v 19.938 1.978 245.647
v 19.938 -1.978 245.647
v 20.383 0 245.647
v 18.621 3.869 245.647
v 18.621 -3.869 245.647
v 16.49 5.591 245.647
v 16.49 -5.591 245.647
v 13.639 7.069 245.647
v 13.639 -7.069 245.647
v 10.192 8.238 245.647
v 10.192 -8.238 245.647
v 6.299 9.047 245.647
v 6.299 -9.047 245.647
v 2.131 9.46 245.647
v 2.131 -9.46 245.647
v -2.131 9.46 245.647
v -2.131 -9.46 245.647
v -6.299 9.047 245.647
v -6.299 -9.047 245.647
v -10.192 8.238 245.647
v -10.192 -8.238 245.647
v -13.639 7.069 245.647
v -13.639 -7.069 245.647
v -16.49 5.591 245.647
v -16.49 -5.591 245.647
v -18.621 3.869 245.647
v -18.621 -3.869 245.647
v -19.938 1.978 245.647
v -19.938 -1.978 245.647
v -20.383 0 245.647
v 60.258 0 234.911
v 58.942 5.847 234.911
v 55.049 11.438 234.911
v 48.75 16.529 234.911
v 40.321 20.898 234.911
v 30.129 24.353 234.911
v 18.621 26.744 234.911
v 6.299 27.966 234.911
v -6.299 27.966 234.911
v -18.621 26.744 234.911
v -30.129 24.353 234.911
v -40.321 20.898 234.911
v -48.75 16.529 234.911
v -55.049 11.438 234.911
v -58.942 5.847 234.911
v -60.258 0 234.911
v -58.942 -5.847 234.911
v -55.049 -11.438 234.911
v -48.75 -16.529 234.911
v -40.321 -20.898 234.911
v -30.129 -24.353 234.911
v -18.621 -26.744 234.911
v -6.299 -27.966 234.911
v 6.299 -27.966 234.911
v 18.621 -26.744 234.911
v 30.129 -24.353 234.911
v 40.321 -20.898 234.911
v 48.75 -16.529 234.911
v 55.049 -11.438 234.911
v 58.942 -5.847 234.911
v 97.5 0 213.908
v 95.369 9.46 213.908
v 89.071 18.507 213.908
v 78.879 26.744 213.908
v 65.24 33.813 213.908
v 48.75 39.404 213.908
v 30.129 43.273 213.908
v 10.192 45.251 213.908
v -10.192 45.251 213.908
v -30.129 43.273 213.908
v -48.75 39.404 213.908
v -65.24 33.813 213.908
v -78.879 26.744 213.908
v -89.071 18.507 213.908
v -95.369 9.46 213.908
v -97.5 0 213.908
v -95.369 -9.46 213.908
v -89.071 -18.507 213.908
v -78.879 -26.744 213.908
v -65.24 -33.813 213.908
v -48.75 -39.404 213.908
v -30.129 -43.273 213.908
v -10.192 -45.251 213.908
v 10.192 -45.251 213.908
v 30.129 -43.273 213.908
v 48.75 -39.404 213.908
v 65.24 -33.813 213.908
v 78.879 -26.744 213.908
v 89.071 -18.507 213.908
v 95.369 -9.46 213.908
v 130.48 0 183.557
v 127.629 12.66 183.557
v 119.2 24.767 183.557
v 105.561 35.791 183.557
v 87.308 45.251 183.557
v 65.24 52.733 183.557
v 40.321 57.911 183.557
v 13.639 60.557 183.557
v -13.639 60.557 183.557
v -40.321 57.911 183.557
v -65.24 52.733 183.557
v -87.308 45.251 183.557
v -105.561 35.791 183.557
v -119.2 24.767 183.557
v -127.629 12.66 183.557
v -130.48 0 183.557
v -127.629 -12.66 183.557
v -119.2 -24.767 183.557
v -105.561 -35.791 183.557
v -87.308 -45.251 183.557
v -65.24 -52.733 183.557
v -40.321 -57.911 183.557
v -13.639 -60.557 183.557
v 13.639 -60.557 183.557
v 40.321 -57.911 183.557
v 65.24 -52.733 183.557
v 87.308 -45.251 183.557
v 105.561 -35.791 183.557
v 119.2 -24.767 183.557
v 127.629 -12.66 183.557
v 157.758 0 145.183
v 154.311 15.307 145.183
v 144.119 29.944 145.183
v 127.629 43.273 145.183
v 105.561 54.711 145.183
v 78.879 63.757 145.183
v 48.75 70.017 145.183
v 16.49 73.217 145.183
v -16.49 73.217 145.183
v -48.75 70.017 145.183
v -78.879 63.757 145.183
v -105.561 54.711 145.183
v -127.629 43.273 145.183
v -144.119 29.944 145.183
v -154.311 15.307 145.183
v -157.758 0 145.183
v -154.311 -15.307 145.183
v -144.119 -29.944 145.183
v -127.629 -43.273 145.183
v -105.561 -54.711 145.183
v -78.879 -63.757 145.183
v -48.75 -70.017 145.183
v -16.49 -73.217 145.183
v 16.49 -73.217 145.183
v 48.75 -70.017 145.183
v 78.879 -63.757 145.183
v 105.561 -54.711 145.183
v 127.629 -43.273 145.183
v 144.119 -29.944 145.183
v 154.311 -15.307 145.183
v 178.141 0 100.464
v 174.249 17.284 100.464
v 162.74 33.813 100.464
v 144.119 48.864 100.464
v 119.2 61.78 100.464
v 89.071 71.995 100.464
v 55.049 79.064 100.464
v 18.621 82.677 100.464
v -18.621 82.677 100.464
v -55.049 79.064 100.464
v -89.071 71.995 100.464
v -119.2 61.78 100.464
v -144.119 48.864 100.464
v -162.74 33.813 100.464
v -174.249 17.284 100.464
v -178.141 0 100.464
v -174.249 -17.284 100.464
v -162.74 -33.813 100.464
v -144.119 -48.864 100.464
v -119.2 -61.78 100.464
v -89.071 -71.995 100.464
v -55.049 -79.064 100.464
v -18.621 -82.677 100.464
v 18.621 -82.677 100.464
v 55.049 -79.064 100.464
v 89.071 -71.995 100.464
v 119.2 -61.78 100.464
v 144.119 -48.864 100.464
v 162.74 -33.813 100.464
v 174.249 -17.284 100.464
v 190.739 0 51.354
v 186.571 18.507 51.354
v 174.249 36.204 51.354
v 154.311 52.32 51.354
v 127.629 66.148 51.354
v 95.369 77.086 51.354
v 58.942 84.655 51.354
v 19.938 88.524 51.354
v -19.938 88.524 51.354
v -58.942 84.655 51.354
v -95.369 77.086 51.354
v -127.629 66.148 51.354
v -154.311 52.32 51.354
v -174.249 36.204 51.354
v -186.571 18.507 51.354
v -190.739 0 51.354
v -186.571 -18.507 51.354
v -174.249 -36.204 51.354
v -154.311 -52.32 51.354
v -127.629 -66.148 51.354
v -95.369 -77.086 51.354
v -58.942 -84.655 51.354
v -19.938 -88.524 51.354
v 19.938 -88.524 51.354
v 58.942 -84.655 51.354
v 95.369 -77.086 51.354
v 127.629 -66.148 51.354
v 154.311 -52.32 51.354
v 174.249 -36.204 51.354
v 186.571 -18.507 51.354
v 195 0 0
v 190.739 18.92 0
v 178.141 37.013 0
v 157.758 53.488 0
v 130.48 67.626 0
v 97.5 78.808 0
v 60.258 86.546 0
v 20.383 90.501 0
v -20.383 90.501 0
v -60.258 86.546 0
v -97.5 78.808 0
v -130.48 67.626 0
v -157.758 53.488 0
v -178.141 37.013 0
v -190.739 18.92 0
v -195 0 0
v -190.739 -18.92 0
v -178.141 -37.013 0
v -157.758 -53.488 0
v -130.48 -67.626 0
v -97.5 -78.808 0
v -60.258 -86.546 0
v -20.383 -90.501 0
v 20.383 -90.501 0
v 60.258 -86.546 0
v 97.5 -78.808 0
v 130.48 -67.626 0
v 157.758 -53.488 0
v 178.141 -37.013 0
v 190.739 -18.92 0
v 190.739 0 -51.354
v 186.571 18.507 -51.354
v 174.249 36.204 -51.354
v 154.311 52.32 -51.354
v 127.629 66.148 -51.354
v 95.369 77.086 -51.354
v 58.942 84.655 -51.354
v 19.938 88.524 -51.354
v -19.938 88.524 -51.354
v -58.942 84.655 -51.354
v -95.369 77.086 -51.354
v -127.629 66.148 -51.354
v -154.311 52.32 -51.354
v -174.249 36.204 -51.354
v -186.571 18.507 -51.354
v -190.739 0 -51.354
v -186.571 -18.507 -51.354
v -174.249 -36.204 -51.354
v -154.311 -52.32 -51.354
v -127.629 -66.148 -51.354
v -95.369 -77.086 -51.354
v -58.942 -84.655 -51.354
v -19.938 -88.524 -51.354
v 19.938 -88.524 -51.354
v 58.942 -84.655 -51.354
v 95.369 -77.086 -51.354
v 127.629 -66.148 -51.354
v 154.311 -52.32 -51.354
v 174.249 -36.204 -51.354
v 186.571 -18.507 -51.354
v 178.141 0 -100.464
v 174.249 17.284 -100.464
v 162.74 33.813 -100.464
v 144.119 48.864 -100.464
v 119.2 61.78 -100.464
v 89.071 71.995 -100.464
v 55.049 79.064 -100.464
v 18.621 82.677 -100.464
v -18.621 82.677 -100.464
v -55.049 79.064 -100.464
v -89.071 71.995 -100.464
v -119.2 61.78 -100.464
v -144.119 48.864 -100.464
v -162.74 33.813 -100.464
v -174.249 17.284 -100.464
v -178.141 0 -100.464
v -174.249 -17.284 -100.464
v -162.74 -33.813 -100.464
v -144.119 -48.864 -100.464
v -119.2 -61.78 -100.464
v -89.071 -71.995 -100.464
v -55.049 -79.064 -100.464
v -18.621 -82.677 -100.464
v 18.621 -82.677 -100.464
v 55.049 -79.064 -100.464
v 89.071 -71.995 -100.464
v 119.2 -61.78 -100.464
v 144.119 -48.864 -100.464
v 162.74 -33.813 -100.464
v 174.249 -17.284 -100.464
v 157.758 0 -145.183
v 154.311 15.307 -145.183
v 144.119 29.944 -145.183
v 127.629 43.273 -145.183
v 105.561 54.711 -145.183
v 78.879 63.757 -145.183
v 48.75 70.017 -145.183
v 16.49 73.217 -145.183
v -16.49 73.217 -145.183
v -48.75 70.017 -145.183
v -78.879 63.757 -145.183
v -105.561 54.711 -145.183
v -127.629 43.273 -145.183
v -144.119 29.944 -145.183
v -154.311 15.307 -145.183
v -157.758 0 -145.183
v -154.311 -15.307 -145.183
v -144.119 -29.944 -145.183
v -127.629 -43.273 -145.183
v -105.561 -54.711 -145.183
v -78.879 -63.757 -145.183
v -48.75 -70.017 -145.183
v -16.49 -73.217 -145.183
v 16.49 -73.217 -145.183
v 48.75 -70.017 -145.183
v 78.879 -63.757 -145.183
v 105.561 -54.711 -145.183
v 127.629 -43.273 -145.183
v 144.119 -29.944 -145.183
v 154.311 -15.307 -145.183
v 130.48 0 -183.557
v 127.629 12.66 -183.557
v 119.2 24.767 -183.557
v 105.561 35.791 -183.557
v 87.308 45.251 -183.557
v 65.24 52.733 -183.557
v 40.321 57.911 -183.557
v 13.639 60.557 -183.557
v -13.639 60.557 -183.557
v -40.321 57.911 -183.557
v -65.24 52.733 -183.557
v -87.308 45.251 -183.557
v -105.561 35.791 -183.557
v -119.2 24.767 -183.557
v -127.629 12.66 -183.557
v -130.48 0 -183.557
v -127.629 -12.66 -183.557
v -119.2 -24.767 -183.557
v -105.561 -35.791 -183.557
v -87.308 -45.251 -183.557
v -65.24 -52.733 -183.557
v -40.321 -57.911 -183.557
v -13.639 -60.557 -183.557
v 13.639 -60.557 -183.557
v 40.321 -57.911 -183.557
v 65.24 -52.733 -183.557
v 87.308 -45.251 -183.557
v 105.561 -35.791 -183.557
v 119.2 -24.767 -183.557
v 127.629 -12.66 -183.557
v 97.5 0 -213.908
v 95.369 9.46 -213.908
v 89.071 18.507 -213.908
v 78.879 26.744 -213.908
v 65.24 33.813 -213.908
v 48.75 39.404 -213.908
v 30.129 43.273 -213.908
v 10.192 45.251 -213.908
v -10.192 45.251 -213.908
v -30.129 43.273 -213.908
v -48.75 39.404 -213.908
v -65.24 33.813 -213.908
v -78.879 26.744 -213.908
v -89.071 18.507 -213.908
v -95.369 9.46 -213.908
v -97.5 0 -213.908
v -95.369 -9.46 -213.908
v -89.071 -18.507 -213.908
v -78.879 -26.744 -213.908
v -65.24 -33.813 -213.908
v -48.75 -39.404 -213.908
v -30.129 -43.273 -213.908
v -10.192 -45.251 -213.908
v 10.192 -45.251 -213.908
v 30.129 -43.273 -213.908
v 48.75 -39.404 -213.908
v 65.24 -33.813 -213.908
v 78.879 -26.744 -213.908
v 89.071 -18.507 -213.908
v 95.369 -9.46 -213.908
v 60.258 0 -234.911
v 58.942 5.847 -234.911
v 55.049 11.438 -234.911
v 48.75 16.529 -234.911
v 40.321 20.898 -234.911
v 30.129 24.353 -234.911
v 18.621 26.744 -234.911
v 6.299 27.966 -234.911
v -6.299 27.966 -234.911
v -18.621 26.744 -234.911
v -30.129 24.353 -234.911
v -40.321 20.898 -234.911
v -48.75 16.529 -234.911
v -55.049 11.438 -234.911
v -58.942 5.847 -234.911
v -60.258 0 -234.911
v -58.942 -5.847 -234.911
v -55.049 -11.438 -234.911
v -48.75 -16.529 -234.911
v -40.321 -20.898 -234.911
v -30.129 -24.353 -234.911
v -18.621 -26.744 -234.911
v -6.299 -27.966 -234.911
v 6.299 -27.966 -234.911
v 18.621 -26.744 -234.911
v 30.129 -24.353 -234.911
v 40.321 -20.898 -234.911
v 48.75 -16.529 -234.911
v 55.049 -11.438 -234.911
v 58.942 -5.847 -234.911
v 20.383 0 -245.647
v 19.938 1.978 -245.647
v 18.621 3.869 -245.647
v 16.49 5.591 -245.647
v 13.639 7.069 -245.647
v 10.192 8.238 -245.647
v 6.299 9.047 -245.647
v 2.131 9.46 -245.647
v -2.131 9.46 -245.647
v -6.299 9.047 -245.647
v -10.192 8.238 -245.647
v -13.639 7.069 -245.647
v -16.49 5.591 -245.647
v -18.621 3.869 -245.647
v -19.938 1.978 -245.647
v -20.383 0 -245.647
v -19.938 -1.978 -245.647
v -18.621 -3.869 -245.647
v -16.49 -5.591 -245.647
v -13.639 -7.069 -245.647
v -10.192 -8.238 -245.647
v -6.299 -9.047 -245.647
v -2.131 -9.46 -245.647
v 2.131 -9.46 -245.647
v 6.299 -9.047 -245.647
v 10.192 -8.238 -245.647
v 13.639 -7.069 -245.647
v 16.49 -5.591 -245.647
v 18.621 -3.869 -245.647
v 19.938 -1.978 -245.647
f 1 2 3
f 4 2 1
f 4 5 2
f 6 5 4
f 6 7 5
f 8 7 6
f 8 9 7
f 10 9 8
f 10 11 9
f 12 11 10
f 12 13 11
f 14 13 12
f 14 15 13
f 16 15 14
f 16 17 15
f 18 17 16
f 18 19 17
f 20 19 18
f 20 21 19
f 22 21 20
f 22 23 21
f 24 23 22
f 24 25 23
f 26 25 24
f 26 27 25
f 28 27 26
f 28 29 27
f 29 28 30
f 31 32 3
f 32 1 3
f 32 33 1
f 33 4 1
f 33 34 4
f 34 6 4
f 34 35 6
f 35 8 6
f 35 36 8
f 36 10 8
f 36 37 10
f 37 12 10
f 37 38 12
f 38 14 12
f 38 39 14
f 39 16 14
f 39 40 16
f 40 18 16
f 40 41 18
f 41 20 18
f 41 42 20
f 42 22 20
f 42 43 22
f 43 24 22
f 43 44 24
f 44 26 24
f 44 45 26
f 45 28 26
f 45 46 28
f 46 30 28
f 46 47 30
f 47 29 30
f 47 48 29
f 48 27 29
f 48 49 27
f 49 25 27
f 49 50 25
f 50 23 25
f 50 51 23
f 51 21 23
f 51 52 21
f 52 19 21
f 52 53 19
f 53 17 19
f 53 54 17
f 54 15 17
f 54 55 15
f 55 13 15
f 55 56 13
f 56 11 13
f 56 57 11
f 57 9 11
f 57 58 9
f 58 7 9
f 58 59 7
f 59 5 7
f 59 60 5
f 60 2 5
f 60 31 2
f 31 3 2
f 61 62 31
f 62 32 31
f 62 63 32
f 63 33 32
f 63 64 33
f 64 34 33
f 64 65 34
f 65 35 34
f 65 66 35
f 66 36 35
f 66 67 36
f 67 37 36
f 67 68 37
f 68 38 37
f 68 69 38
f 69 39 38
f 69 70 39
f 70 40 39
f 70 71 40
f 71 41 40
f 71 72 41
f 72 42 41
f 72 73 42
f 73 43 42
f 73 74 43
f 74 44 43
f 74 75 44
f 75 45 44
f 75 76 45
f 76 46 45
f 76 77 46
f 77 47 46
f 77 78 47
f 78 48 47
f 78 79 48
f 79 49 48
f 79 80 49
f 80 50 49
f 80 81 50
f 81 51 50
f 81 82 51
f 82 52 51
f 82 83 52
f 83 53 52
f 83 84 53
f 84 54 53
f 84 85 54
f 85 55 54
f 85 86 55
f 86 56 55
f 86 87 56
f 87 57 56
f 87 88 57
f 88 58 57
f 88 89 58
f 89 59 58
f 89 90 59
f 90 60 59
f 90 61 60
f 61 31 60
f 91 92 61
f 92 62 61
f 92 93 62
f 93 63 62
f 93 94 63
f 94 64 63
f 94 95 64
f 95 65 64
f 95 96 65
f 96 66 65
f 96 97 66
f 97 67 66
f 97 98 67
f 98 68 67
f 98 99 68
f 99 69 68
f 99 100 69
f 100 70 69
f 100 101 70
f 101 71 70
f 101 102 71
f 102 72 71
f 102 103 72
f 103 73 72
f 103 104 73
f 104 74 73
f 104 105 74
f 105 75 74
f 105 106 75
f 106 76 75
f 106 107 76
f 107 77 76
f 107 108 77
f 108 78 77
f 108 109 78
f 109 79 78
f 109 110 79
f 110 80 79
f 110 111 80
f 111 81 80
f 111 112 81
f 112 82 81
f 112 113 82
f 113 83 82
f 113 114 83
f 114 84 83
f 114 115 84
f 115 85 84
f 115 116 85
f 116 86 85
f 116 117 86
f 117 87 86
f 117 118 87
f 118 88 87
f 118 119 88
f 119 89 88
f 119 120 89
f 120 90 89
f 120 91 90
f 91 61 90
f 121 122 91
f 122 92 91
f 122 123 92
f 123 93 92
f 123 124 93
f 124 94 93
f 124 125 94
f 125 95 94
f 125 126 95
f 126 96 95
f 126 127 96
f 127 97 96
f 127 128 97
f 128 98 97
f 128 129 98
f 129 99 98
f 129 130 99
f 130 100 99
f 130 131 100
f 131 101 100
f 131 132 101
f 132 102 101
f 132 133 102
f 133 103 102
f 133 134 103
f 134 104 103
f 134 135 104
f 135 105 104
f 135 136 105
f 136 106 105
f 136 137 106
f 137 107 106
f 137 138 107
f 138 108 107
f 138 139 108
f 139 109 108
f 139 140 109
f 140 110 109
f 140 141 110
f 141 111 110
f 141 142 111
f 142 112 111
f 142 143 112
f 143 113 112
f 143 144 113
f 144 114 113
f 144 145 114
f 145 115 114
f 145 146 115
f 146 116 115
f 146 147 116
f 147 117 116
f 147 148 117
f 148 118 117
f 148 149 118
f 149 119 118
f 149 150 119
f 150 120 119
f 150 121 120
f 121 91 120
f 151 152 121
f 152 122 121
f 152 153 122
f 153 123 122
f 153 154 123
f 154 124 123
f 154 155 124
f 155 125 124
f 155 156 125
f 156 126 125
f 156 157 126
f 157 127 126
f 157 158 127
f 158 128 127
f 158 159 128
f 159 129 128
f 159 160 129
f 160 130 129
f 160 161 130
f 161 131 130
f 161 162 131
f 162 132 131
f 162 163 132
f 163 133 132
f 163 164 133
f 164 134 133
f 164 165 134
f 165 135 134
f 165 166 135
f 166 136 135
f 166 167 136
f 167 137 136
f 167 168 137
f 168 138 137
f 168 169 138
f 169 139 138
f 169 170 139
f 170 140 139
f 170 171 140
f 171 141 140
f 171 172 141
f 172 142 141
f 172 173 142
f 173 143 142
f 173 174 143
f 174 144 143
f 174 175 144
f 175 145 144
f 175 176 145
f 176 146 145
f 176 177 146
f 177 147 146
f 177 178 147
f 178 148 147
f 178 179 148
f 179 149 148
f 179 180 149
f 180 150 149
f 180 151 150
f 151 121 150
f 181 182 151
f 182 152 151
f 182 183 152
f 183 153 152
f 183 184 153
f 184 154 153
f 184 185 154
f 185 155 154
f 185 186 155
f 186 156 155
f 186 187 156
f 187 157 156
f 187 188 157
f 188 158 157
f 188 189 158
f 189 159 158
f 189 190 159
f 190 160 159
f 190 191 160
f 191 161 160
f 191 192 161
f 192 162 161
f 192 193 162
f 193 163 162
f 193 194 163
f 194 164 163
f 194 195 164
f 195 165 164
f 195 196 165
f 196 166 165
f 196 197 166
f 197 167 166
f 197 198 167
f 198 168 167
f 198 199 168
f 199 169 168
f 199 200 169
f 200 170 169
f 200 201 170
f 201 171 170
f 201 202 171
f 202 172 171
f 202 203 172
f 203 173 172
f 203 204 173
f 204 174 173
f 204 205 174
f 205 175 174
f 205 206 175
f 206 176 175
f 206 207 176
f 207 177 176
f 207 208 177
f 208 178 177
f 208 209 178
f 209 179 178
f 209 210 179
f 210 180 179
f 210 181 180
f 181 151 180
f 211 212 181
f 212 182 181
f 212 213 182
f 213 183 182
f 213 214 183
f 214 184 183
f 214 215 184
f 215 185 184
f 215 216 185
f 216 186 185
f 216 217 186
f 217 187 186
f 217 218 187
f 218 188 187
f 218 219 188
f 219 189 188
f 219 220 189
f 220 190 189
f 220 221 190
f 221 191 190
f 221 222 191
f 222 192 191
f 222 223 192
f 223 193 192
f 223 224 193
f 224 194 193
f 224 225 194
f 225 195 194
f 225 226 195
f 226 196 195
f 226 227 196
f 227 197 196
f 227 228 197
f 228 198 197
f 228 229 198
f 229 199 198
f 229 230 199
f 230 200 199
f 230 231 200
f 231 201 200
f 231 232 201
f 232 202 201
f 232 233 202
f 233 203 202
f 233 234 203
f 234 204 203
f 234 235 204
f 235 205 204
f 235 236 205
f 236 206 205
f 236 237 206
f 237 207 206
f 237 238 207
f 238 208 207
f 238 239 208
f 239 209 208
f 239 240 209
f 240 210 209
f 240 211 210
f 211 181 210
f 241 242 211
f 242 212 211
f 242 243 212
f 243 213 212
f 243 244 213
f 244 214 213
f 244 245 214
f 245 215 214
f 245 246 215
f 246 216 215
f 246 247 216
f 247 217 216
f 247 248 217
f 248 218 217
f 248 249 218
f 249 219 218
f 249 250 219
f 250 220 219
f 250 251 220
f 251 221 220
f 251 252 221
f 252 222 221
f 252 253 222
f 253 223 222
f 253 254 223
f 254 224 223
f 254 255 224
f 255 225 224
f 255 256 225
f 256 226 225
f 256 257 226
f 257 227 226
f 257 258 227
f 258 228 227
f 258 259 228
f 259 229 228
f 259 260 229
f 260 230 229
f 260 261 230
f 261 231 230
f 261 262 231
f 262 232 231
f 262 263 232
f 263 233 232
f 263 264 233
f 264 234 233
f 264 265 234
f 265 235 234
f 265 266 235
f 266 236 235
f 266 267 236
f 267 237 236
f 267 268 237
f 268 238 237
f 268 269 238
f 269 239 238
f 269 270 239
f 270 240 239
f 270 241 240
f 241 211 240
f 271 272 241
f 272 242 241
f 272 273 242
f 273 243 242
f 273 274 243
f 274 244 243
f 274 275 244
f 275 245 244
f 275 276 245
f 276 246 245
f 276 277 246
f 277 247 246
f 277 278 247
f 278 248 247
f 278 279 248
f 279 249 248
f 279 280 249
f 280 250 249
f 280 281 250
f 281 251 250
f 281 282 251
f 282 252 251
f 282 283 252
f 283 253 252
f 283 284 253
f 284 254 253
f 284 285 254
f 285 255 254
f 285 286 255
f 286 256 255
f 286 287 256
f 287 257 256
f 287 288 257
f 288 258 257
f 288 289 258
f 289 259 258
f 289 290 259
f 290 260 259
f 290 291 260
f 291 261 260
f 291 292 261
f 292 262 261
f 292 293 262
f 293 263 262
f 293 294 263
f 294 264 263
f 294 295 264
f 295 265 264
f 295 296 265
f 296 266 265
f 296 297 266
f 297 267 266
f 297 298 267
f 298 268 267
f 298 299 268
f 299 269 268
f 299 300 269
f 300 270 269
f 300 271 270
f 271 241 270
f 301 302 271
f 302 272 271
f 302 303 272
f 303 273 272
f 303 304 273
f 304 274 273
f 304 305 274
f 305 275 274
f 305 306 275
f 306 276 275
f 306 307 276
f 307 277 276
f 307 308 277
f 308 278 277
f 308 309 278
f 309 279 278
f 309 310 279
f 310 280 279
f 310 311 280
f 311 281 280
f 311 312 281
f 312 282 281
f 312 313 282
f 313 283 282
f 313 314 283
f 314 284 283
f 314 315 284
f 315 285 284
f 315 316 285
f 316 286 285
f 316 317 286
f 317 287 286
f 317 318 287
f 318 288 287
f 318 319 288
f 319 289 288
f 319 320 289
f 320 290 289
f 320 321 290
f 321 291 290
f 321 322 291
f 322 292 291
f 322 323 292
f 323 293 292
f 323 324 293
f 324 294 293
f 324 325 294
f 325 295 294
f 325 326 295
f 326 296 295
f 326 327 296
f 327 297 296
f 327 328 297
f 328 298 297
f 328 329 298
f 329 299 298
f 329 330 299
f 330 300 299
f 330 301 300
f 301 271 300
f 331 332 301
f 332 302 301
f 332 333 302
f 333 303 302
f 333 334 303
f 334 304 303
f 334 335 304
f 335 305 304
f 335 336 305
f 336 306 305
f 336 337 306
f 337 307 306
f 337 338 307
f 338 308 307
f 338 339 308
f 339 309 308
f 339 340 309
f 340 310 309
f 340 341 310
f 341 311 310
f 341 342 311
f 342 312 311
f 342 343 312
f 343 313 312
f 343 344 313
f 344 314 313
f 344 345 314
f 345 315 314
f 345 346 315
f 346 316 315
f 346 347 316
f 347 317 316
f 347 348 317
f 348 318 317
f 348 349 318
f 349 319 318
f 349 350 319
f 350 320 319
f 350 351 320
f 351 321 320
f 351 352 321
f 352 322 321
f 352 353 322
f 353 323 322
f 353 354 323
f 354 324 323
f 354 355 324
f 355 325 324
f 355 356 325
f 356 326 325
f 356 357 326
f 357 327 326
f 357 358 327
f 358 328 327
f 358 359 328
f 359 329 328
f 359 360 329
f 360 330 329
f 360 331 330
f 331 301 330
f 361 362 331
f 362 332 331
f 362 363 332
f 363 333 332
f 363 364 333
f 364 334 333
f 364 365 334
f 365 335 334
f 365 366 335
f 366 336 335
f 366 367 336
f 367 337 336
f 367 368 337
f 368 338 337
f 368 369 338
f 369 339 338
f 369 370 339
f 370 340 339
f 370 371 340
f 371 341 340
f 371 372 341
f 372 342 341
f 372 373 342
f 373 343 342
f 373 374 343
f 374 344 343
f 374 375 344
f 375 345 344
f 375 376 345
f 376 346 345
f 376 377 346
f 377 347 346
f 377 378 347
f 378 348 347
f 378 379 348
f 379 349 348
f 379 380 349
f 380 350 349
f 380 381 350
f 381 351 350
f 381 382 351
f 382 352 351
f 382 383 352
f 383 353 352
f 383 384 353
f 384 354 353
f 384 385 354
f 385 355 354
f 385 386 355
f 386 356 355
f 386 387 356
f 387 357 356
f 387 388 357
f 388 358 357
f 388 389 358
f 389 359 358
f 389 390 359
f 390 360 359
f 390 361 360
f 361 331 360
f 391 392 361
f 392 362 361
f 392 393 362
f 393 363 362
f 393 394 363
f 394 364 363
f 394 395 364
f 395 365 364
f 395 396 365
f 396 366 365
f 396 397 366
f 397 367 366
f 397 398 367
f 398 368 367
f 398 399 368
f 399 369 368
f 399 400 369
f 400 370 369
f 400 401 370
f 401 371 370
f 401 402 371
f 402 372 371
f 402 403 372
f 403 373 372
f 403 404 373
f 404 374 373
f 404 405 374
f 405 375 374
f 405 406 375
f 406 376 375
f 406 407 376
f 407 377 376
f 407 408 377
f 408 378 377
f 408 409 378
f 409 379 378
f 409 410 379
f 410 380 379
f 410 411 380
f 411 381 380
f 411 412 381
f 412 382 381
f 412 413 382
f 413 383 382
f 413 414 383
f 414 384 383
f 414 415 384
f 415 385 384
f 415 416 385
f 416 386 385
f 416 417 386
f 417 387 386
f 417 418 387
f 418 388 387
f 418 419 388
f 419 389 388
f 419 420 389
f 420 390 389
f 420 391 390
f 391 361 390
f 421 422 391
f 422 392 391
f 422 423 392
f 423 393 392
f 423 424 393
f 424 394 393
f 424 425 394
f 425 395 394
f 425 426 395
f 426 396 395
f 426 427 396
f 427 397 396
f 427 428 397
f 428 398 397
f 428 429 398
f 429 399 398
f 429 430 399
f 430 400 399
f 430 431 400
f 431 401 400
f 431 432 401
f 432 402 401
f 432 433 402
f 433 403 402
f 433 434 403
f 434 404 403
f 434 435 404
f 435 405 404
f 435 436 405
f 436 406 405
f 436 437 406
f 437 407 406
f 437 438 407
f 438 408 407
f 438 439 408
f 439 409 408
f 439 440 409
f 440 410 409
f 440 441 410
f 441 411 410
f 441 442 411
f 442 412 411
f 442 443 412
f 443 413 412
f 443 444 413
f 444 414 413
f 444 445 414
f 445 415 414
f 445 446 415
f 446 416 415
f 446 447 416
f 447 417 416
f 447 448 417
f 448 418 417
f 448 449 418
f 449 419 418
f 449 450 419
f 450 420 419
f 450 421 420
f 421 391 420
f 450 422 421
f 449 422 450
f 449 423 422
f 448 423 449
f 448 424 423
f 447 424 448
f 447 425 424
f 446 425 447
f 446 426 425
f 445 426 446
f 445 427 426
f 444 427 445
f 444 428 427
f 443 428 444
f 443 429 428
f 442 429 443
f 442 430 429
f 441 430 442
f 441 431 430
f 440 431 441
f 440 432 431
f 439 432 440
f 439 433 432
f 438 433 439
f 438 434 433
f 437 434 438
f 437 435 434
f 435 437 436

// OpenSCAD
// Generated by SolidPython 1.0.1 on 2020-07-29 00:46:51


scale(v = [15, 7, 19]) {
	sphere(r = 13);
}
/***********************************************
*********      SolidPython code:      **********
************************************************
 
# import packages: SolidPython
from solid import *
from solid.utils import *
from itertools import chain, combinations, permutations


class Resize:

    def __init__(self, scad_file):
        self.scad_file = scad_file
        #self.scad_file = import_scad(scad_file)
        # cone/cylinder param:
        self.r1 = 0
        self.r2 = 0
        self.h = 0
        # rectangular prism param:
        self.w = 0
        self.l = 0
        # ellipse param:
        self.r = 0

    # import OpenScad code (file name corresponds to shape)


    # classify shape + parameters
    def assign(self, param1, param2, param3):
        if self.scad_file == 'cone.scad':
            self.r1 = param1
            self.r2 = param2
            self.h = param3
        elif self.scad_file == 'cylinder.scad':
            self.r1 = param1
            self.r2 = param2
            self.h = param3
        elif self.scad_file == 'rectangularPrism.scad':
            self.h = param1
            self.l = param2
            self.w = param3
        else:
            self.r = param1
            self.h = param2

    # resize parameters
    def iterate(self):
        x = range(3, 20, 2)
        i = 1
        if self.scad_file == 'cone.scad':
            tempList = list(permutations(x, 2))
            for temp in tempList:
                param1 = temp[0]
                param2 = temp[1]
                filepath = 'produced_scad_files/' + 'cone' + str(param1) + '_' + str(param2) + '_' + '.scad'
                scad_render_to_file(cylinder(h=param1, r1=param2, r2=0), filepath)

        elif self.scad_file == 'cylinder.scad':
            tempList = list(permutations(x, 3))
            for temp in tempList:
                param1 = temp[0]
                param2 = temp[1]
                filepath = 'produced_scad_files/' + 'cylinder' + str(param1) + '_' + str(param2) + '_' + '.scad'
                scad_render_to_file(cylinder(h=param1, r1=param2, r2=param2), filepath)

        elif self.scad_file == 'rectangularPrism.scad':
            tempList = list(permutations(x, 3))
            for temp in tempList:
                param1 = temp[0]
                param2 = temp[1]
                param3 = temp[2]
                filepath = 'produced_scad_files/' + 'rectangularPrism' + str(param1) + '_' + str(param2) + '_' + str(
                    param3) + '.scad'
                scad_render_to_file(cube(size=(param1, param2, param3)), filepath)

        elif self.scad_file == 'ellipse.scad':
            tempList = list(permutations(x, 4))
            for temp in tempList:
                param1 = temp[0]
                param2 = temp[1]
                param3 = temp[2]
                param4 = temp[3]
                filepath = 'produced_scad_files/' + 'ellipse' + str(param1) + '_' + str(param2) + '_' + str(param3) + '_' + str(param4) + '.scad'
                scad_render_to_file(scale([param1, param2, param3])(sphere(r=param4)), filepath)

    def render_to_scadfile(self):
        scad_render_to_file(scad, 'example.scad') 
 
************************************************/
